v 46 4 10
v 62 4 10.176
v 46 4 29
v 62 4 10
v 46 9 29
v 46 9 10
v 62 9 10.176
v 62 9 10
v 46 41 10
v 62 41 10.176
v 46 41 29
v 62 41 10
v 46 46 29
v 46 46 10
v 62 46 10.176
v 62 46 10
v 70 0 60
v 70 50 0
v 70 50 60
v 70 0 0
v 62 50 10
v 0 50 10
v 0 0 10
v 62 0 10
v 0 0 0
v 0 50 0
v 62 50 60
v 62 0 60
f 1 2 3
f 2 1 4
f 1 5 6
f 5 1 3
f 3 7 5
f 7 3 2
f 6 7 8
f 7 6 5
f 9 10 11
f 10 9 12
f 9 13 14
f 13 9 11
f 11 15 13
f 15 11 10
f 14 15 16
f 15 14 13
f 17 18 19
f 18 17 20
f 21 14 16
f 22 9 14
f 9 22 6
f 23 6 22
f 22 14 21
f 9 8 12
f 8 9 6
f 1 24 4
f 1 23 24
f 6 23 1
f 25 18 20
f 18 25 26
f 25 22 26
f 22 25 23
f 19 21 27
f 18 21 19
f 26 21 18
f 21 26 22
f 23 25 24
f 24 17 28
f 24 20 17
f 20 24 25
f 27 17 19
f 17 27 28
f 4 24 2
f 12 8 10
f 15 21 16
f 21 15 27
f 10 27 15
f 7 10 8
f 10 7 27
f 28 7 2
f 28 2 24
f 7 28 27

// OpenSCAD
$fn = 32;

// ----------------------------------------------------------------------
// Rib bracket: 2-gusset L bracket
// ----------------------------------------------------------------------

// --- parameters (mm) ---
base_l = 70;              // foot length, X
base_w = 50;              // foot width, Y
base_t = 10;              // foot thickness
plate_t = 8;              // upright plate thickness
plate_h = 60;             // overall height
gus_l = 16;               // gusset leg along the foot
gus_h = 20;               // gusset height
gus_t = 5;                // gusset thickness
gus_edge = 4;             // gusset margin from the foot edge
n_gus = 2;                // gusset count

gus_pitch = (base_w - 2 * gus_edge - gus_t) / (n_gus - 1);  // gusset pitch

union() {
  cube([base_l, base_w, base_t]);
  translate([base_l - plate_t, 0, base_t - 1])
    cube([plate_t, base_w, plate_h - base_t + 1]);
  for (i = [0 : n_gus - 1])
    translate([base_l - plate_t - gus_l, gus_edge + i * gus_pitch, base_t - 1])
      rotate([-90, 0, 0])
        linear_extrude(height = gus_t)
          polygon(points = [[0, 0], [gus_l + 1, 0], [0, -gus_h]]);
}
